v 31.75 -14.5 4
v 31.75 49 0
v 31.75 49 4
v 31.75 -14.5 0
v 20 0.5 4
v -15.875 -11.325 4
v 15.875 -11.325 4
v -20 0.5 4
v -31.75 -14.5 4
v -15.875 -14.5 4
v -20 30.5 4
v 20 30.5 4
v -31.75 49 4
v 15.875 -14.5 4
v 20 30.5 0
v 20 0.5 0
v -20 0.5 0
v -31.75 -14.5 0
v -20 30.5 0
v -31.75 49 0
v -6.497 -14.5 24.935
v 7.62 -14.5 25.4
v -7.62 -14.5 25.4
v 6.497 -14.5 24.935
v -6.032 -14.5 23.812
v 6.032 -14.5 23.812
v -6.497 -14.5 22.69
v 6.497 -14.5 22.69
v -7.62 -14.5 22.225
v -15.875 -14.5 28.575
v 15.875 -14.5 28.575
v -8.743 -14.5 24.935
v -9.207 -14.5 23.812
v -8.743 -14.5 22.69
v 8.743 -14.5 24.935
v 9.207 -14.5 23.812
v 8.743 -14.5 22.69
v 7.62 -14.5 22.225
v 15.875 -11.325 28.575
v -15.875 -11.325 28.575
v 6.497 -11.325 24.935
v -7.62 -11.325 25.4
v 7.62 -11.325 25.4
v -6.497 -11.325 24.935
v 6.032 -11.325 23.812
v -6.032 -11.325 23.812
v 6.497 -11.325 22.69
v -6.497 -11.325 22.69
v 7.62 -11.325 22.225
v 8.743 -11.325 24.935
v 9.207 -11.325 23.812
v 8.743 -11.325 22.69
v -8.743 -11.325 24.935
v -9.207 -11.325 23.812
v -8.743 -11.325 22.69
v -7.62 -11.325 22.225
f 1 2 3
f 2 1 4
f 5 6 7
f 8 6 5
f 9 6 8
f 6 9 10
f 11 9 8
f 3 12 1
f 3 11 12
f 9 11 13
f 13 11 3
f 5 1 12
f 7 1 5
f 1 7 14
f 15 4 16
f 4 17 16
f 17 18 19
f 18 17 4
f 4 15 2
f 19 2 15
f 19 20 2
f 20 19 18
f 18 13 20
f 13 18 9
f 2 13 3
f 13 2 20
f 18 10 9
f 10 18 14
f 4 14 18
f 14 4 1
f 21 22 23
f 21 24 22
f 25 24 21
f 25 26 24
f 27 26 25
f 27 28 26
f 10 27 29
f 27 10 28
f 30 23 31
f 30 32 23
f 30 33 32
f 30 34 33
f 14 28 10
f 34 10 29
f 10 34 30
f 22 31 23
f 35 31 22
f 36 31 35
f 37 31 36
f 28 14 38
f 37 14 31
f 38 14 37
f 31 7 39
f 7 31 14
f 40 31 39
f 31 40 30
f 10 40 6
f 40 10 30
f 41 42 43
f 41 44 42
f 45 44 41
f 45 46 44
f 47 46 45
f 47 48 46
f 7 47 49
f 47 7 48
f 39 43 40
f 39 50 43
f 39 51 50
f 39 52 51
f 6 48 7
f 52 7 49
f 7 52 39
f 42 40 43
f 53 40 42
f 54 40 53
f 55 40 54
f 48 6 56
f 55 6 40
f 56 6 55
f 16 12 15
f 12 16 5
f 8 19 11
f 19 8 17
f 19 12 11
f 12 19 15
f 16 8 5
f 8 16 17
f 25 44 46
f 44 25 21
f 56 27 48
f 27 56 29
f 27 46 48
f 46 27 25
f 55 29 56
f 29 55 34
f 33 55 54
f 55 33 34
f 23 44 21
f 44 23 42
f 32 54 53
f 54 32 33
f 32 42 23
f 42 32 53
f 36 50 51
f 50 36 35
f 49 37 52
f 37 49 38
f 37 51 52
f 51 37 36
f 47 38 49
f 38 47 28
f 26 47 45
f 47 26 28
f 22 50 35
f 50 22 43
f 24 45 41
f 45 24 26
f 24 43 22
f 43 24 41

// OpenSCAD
// file: utils.scad
//
// general utility functions for OpenSCAD
//
function inch(in) = 25.4*in;
// main file
// mount for 35mm slides and compatible optical components
// Copyright (C) 2016, Theodore C Yapo

use <utils.scad>;


ring_length = 10;
center_height = 14.5;
outer_d = 2*center_height / cos(30);
ring_thickness = 4;
inner_d = outer_d - 2*ring_thickness;
screw_spacing = inch(0.6);
base_width = inch(1.25);
base_thickness = inch(0.125);
base_length = inch(1.125);

face_width = inch(2.5);
face_height = inch(2.5);
nut_block_thickness = 6;
nut_block_width = 12;

// recesses for #4-40 hex nuts
nut_d = inch(0.25) / cos(30) + 0.5;
nut_h = 3;

set_screw_d = inch(0.125);
mounting_hole_spacing = 40;
mounting_hole_height = 15;
mounting_hole_d = 3;
mounting_slot_length = 3;

epsilon = 1;

slide_aperture_height = 30;
slide_aperture_width = 40;

face_thickness = 4;

module LED_mount(){
  difference(){
    union(){
      // face
      translate([-face_width/2, -center_height, 0]){
        cube([face_width, face_height, face_thickness]);
      }

      // base
      translate([-base_width/2, -center_height, 0]){
        cube([base_width, base_thickness, base_length]);
      }
    }

    // slide aperture
    translate([-slide_aperture_width/2,
               +slide_aperture_height/2-center_height,
               -epsilon]){
      cube([slide_aperture_width,
            slide_aperture_height,
            face_thickness + 2*epsilon]);
    }


    // mounting screw holes
    translate([-inch(0.6)/2,
               -center_height-epsilon,
               (base_length - inch(0.75))/2]){
      rotate([-90, 0, 0]){
        *cylinder($fn=8, d = inch(0.125), h = inch(0.25));
      }
    }
    translate([+inch(0.6)/2,
               -center_height-epsilon,
               (base_length - inch(0.75))/2]){
      rotate([-90, 0, 0]){
        *cylinder($fn=8, d = inch(0.125), h = inch(0.25));
      }
    }
    translate([-inch(0.6)/2,
               -center_height - epsilon,
               base_length - (base_length - inch(0.75))/2]){
      rotate([-90, 0, 0]){
        cylinder($fn=8, d = inch(0.125), h = inch(0.25));
      }
    }
    translate([+inch(0.6)/2,
               -center_height - epsilon,
               base_length - (base_length - inch(0.75))/2]){
      rotate([-90, 0, 0]){
        cylinder($fn=8, d = inch(0.125), h = inch(0.25));
      }
    }
  }  
}

module HS()
{
  translate([-19/2, -14/2, 1.6]){
    cube([19, 14, 5]);
  }
}
module Saber_Z1()
{
  translate([-9.9/2, -9.9/2, 0]){
    cube([34.8, 9.9, 1.6]);
  }
}

module printing_layout()
{
  // rotate([0, 90, 0]){
    LED_mount();
    // }
}

module LED_mount_assembly()
{
  LED_mount();

  translate([0, 0, face_thickness]){
    Saber_Z1();
    color("red") HS();
  }
}


printing_layout();

//LED_mount_assembly();
